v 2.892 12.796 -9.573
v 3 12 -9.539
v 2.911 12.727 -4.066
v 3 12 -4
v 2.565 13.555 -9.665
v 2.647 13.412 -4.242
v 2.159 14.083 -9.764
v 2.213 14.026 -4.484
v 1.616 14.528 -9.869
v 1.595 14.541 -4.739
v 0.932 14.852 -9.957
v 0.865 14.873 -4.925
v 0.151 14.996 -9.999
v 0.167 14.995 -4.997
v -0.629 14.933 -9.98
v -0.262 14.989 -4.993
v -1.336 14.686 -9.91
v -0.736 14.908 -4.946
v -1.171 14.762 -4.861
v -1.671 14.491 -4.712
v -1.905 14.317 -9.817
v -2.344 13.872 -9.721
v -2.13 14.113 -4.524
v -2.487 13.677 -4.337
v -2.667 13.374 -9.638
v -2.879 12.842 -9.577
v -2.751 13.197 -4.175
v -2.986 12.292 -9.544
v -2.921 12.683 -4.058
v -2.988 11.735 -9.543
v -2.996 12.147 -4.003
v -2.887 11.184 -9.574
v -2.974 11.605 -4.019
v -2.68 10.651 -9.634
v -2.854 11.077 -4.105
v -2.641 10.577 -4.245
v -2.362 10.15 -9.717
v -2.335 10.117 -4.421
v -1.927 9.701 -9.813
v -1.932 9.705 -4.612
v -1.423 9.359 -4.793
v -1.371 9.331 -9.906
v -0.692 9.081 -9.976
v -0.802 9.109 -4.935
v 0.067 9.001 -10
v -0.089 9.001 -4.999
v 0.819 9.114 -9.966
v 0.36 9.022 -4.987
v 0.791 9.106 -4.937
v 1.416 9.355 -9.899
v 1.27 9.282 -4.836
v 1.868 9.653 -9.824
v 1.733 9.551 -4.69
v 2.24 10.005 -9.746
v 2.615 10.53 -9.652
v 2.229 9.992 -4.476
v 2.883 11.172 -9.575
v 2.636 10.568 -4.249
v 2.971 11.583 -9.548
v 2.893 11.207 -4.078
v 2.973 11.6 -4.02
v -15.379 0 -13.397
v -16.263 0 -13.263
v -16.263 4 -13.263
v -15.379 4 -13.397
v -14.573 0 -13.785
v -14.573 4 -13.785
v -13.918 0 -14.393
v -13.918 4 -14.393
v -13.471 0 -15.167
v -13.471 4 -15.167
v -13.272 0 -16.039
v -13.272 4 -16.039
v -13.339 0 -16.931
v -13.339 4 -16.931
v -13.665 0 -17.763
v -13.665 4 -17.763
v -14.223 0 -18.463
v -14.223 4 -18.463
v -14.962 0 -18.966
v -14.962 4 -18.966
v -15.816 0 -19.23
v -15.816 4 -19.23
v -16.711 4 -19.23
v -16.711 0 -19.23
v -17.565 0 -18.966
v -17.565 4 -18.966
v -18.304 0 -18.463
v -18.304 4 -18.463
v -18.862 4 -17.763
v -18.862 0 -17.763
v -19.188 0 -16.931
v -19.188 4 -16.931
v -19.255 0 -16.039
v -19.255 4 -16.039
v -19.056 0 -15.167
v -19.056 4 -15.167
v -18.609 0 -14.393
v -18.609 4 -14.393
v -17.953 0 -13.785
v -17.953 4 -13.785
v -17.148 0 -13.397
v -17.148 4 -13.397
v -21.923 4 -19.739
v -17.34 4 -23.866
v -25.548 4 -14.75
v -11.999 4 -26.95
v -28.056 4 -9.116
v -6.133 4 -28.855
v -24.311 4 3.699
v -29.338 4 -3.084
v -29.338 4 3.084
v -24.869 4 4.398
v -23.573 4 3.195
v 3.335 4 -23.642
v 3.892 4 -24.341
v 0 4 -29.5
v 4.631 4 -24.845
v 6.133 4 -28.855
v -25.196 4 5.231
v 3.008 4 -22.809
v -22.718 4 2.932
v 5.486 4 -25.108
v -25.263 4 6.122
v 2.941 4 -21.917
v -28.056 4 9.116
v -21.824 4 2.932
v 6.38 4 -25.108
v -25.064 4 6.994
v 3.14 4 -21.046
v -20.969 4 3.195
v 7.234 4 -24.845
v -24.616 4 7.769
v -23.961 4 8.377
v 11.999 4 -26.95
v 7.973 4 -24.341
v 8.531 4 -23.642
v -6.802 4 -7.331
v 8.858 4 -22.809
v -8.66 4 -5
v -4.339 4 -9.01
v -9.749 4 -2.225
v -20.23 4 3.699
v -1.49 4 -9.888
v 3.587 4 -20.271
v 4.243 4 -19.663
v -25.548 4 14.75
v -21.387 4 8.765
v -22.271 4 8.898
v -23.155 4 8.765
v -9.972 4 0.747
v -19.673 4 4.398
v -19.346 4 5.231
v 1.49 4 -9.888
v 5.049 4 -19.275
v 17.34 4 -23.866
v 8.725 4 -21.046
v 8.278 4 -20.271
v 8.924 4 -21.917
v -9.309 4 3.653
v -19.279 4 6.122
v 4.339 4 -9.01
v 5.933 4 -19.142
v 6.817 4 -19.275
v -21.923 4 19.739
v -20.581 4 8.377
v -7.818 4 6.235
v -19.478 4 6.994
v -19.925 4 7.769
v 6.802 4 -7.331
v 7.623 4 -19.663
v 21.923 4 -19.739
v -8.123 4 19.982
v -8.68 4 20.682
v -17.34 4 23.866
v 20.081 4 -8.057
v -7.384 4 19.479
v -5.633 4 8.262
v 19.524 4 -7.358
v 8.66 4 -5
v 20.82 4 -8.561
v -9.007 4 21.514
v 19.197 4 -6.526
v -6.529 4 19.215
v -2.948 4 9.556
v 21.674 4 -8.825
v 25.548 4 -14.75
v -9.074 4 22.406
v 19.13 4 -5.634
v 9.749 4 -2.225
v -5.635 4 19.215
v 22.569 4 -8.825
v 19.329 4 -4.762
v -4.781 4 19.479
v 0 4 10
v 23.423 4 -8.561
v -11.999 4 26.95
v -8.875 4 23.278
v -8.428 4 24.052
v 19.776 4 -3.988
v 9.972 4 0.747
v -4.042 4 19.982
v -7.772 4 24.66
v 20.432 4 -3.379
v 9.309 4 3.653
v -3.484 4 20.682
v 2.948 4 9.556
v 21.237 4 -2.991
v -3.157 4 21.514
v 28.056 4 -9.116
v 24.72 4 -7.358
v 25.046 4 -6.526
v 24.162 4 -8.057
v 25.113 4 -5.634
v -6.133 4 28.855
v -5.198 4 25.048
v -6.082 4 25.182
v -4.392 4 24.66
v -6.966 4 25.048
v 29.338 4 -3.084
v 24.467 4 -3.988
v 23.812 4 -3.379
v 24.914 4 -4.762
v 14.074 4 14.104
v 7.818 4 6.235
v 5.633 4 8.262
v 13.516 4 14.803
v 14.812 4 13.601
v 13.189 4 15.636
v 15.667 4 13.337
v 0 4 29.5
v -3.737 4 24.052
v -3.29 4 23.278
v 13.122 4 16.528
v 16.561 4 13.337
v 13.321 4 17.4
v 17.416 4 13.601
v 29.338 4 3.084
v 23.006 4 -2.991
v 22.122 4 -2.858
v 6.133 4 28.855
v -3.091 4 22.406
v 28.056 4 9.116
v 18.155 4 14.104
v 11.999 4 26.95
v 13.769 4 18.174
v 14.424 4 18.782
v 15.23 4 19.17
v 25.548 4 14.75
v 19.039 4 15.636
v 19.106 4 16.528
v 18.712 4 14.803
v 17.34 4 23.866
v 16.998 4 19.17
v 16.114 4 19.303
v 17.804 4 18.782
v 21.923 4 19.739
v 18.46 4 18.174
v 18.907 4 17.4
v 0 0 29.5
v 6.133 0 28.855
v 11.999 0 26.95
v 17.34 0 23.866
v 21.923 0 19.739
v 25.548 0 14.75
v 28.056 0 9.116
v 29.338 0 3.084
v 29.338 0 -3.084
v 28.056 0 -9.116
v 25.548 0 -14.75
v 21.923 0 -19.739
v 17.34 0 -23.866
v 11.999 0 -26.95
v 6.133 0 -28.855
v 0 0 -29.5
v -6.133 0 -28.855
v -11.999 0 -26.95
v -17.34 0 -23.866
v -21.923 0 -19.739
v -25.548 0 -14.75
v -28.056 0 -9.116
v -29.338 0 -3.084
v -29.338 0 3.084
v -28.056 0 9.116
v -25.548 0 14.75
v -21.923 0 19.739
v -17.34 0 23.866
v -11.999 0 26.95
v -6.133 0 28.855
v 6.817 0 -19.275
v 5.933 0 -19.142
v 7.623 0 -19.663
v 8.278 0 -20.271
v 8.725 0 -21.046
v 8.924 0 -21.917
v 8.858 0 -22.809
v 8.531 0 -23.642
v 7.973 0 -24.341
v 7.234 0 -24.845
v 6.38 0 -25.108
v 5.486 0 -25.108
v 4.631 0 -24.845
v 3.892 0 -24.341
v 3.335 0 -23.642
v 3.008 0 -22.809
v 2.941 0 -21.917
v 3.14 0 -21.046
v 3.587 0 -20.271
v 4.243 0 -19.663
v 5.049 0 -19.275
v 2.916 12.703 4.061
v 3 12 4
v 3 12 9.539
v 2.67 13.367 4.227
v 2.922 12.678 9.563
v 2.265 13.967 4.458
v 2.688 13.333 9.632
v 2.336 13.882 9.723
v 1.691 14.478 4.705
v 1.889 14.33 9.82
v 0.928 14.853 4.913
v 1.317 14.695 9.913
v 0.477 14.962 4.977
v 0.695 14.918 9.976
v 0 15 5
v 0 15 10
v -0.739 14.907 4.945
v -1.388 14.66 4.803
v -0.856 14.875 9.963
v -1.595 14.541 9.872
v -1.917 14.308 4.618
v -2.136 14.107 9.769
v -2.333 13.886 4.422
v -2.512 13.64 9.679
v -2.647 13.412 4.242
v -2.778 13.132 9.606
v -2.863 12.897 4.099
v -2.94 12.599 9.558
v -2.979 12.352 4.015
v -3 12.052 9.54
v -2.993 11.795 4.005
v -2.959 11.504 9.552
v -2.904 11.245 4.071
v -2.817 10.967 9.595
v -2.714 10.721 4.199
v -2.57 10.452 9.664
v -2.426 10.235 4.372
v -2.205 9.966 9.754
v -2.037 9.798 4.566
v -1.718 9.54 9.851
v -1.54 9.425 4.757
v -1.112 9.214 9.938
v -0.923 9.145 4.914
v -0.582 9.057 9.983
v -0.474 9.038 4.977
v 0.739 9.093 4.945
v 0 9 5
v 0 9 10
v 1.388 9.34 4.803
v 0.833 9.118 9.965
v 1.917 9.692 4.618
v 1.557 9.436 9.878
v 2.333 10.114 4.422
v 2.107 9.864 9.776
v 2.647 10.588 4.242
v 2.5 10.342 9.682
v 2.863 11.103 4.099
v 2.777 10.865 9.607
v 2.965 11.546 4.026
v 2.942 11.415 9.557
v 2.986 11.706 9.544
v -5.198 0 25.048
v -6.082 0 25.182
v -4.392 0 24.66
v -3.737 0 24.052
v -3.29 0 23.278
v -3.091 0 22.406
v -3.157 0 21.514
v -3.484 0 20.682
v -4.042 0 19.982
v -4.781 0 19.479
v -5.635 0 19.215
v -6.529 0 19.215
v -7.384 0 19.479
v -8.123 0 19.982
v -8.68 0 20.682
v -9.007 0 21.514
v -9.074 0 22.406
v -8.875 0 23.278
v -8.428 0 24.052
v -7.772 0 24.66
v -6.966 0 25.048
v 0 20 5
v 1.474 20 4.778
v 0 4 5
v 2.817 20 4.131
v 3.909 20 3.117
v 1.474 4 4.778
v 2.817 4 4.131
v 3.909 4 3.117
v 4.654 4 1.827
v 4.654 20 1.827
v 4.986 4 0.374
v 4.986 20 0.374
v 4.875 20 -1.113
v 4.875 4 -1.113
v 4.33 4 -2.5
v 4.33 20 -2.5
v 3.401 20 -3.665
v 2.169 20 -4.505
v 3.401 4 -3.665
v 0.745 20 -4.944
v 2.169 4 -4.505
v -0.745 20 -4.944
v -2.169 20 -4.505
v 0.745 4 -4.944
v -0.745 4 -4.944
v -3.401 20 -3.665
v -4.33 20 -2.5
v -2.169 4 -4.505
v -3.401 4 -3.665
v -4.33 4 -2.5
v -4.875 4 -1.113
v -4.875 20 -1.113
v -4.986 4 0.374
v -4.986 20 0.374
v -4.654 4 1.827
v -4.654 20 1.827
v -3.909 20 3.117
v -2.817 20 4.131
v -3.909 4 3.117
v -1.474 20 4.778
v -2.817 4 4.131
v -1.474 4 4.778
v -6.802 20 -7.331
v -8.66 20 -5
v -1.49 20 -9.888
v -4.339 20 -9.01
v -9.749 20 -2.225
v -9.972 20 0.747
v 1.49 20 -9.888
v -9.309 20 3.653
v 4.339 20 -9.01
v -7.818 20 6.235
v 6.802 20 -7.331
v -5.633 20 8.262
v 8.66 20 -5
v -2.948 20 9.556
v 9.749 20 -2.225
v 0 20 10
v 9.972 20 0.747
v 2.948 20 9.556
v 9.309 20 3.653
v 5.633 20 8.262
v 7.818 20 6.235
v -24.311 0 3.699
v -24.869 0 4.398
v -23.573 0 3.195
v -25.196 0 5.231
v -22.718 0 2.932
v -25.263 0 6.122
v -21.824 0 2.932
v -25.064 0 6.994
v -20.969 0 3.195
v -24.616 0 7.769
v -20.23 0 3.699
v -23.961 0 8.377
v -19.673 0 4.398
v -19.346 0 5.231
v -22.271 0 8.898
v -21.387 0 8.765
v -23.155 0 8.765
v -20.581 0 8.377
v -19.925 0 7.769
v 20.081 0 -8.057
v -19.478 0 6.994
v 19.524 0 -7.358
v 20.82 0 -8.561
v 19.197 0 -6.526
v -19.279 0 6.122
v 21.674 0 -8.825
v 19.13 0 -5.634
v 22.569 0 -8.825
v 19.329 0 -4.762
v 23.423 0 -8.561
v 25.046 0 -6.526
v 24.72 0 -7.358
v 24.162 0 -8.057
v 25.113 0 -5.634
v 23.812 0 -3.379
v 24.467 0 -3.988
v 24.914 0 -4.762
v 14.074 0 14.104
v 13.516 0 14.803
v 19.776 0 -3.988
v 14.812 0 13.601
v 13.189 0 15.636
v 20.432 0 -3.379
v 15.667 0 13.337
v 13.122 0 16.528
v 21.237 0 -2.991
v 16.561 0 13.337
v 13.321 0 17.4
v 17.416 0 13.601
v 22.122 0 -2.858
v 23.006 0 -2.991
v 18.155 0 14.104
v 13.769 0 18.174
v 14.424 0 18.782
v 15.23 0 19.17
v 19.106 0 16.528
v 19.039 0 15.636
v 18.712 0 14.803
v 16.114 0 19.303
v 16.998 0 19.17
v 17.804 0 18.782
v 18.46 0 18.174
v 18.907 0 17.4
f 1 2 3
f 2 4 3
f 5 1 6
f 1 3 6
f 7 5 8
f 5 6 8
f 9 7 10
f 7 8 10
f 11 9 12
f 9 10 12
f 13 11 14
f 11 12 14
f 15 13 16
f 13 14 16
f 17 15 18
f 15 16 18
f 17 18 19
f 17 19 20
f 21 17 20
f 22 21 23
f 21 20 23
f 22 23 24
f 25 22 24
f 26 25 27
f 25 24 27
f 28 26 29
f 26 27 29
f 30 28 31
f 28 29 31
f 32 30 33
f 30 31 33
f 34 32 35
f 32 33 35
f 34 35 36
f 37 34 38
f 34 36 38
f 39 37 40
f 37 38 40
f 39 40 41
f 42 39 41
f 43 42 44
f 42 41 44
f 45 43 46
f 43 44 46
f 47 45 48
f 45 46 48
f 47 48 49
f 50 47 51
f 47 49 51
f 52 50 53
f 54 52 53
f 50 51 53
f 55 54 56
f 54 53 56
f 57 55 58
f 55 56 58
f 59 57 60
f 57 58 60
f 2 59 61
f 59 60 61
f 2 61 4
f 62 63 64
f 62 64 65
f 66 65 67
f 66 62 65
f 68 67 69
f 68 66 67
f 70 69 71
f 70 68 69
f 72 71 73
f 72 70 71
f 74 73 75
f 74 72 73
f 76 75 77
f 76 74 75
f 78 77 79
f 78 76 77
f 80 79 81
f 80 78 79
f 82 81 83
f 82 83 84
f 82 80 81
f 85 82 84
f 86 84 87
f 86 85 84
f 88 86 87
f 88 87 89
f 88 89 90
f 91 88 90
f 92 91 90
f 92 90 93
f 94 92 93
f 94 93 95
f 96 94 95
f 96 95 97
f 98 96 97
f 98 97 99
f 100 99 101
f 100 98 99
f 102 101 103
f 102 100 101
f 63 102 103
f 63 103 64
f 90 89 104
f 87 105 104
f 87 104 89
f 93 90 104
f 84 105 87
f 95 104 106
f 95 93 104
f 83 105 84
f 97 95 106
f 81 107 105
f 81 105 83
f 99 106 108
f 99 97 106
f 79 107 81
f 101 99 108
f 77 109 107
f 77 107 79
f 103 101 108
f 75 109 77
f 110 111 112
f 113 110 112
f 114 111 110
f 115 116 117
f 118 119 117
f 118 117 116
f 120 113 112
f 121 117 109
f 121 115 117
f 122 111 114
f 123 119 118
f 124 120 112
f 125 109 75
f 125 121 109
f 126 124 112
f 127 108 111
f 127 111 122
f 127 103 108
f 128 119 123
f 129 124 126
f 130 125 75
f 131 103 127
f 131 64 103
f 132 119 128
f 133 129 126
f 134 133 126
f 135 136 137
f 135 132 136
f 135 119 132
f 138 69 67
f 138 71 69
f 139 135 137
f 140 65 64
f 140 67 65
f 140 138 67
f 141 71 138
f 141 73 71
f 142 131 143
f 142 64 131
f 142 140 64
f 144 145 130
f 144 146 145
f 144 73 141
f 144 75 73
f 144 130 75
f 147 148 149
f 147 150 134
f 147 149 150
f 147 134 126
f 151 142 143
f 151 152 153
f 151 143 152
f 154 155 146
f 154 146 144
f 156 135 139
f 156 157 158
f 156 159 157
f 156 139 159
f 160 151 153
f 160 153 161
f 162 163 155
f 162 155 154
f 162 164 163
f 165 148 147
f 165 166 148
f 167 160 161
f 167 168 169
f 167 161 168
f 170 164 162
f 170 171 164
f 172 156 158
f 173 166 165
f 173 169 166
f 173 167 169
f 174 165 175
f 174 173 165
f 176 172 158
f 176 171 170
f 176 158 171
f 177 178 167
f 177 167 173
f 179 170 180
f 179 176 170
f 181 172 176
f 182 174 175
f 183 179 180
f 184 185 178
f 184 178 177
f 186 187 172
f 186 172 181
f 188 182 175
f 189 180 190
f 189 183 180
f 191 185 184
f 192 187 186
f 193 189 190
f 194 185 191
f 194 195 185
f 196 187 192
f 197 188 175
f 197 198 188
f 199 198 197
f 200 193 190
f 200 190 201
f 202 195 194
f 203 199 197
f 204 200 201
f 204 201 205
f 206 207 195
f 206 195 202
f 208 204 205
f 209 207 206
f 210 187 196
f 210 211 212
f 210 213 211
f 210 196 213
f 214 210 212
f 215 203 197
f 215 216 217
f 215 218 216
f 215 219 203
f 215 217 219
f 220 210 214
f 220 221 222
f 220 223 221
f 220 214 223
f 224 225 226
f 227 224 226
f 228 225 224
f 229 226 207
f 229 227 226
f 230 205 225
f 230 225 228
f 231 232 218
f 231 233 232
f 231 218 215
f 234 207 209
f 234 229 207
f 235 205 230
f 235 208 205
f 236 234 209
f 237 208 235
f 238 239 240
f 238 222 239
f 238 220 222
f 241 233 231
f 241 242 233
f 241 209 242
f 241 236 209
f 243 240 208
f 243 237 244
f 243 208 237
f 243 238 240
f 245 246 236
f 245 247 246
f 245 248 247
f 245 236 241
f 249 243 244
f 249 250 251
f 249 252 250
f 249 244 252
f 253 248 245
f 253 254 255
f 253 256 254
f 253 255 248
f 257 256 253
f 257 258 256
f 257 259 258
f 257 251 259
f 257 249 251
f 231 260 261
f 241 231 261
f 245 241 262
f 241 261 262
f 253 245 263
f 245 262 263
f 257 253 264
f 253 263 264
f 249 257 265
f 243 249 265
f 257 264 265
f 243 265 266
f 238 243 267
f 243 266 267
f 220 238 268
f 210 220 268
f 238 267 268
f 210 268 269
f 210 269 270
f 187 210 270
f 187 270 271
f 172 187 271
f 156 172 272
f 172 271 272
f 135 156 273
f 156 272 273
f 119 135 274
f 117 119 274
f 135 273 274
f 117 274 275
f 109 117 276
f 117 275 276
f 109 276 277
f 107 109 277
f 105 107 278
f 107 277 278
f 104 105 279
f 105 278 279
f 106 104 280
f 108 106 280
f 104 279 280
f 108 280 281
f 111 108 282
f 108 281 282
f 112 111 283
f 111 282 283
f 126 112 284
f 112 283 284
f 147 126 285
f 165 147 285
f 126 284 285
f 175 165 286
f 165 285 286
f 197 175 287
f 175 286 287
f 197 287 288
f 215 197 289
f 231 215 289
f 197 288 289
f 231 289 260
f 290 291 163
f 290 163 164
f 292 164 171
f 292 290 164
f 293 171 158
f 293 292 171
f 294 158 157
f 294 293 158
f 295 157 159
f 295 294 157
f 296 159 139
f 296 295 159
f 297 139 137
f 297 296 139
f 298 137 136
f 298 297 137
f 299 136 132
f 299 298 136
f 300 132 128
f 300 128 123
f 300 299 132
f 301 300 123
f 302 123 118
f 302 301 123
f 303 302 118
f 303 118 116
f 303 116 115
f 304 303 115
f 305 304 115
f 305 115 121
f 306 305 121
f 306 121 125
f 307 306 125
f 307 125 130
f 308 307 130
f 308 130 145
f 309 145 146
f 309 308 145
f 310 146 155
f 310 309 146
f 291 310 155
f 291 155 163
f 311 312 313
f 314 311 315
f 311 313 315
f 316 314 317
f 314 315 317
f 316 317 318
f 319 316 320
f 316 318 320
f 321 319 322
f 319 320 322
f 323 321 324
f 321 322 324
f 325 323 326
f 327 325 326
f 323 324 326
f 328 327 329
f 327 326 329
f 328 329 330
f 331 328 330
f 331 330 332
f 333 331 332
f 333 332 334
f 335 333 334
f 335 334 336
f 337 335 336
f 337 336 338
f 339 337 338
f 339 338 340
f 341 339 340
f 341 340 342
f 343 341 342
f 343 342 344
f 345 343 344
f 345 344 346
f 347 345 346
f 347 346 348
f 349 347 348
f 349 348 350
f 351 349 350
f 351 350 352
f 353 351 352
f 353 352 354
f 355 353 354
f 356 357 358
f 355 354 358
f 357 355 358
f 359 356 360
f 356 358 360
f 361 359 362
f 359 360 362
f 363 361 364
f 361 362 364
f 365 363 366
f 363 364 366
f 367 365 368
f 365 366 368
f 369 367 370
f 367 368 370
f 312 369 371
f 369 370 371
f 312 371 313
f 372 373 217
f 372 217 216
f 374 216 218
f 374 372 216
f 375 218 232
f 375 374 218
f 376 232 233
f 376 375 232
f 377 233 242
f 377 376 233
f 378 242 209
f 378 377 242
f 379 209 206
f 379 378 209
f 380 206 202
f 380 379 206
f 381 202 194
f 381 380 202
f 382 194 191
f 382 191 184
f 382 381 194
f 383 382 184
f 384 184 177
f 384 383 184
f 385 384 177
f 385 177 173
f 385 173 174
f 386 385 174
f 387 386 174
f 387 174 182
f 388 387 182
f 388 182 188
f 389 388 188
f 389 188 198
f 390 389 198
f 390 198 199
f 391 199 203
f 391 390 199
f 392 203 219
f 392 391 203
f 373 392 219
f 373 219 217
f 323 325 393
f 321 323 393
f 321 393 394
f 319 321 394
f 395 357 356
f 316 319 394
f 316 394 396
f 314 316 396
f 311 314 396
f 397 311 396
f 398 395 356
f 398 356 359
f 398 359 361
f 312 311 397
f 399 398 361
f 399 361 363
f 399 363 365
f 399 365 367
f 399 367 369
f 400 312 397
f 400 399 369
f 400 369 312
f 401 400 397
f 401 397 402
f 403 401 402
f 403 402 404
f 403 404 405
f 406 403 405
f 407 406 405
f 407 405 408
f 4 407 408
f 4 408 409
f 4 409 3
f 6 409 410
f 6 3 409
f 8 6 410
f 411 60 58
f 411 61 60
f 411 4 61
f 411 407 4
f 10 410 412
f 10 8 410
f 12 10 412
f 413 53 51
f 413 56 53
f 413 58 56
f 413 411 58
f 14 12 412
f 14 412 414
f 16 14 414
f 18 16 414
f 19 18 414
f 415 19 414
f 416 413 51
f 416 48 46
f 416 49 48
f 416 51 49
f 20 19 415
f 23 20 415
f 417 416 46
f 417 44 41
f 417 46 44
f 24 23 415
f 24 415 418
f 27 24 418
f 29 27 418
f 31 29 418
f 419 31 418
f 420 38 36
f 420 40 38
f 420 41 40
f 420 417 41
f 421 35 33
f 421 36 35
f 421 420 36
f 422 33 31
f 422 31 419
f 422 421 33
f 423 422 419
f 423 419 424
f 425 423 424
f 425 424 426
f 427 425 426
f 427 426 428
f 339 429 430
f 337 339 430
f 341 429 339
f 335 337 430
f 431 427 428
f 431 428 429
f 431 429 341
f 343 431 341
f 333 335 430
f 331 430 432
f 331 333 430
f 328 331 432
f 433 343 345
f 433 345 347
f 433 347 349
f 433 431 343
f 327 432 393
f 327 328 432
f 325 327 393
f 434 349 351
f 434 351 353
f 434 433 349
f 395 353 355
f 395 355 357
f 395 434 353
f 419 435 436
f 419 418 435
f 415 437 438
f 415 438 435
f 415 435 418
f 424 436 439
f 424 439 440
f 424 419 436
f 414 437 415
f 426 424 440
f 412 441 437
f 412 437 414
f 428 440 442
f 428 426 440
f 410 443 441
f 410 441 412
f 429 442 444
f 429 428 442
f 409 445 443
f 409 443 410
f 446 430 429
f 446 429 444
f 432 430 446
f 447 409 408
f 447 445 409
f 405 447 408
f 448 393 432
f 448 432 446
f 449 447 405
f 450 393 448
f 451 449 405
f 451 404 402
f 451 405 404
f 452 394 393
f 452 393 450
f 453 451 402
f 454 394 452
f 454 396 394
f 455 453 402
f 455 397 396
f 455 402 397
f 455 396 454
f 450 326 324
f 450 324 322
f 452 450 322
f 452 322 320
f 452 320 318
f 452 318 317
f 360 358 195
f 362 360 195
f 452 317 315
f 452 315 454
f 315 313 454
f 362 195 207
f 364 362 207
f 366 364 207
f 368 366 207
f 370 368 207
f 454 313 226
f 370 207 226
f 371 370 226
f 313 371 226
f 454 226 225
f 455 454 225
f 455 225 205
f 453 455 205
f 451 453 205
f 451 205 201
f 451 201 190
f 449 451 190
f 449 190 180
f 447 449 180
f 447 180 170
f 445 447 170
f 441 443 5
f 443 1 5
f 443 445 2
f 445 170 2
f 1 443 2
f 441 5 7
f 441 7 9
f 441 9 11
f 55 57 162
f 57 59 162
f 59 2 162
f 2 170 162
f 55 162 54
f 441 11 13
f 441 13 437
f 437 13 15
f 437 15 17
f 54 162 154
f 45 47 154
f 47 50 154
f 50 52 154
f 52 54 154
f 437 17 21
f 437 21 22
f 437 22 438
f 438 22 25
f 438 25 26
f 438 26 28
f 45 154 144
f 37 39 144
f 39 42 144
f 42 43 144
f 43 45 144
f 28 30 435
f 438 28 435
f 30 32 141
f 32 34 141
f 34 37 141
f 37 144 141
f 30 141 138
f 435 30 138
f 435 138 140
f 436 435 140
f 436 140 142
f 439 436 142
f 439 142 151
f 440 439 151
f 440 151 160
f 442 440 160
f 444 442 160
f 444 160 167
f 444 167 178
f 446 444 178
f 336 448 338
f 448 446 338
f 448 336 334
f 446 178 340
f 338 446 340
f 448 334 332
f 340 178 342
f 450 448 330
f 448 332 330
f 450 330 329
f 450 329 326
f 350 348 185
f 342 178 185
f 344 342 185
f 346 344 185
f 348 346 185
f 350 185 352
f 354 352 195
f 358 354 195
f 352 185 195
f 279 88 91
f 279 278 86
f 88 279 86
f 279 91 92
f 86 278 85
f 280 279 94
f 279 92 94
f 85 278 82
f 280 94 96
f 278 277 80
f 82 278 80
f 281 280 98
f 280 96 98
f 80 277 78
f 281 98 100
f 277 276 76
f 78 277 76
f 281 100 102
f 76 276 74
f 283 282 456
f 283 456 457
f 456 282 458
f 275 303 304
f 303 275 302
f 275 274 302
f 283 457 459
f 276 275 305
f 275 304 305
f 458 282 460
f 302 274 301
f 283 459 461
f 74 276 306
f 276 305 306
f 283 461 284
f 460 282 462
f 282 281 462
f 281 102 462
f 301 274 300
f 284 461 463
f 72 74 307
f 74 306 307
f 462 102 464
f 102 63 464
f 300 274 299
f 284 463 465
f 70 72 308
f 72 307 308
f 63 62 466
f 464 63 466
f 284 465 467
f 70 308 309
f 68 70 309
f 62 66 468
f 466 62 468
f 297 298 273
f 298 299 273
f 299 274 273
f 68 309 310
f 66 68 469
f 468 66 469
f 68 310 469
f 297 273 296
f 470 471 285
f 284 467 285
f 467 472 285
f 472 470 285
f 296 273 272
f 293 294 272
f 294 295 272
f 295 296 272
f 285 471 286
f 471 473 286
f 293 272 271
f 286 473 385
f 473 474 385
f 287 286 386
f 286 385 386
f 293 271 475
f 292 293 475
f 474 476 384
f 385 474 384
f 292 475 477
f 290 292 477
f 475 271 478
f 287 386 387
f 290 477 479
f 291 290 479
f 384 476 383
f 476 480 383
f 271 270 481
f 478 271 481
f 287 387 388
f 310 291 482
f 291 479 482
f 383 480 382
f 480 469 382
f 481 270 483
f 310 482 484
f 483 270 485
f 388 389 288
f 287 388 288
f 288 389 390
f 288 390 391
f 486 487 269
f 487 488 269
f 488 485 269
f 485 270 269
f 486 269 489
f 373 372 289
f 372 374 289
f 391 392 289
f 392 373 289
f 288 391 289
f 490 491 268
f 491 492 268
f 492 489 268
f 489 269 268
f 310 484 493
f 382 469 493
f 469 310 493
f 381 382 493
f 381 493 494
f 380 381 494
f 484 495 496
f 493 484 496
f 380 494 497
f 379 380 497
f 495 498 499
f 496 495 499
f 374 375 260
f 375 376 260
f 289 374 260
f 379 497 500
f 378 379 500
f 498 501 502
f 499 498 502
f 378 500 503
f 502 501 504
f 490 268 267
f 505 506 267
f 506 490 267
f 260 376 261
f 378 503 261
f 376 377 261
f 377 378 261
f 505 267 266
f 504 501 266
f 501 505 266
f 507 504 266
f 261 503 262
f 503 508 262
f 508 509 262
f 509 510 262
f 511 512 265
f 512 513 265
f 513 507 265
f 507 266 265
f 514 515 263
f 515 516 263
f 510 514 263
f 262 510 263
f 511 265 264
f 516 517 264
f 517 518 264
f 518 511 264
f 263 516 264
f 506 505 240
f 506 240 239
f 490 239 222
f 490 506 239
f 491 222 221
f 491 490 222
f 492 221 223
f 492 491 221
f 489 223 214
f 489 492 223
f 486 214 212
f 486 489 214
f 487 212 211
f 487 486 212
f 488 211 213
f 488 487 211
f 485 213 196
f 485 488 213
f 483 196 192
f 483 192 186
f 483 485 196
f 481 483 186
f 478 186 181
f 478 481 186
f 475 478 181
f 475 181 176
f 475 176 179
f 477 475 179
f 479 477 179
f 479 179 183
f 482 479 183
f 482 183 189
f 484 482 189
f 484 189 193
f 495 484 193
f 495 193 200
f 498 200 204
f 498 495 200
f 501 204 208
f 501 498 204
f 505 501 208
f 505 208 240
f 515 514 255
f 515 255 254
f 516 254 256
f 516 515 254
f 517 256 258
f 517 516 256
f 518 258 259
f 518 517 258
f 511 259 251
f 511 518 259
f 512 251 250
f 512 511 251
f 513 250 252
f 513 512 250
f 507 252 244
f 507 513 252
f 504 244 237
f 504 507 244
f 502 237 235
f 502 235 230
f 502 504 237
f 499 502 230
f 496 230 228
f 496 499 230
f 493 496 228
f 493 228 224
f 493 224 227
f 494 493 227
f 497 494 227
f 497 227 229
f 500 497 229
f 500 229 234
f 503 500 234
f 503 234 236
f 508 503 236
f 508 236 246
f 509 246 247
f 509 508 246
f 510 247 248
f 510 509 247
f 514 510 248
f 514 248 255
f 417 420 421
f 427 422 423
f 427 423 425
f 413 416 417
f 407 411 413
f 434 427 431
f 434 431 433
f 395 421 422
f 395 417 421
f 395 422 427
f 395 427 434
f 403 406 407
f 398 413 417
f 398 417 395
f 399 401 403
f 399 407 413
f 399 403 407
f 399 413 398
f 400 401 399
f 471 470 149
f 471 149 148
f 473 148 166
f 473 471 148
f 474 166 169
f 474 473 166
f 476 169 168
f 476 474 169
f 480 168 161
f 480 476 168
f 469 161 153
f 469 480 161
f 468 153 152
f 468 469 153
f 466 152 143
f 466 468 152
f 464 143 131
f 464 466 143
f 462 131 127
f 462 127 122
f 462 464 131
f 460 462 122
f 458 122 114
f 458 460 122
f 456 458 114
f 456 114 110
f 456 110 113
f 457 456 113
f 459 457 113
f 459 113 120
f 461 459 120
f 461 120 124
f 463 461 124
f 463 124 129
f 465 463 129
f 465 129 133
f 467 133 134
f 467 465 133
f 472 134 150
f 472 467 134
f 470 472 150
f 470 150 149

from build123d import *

# Parameters (mm, degrees)
SKETCH1_R           = 29.5
SKETCH1_R_2         = 3
BOSS_EXTRUDE1_DEPTH = 4
SKETCH2_R           = 10
SKETCH2_R_2         = 5
BOSS_EXTRUDE2_DEPTH = 16
SKETCH3_R           = 3
CUT_EXTRUDE1_DEPTH  = 13


with BuildPart() as part:
    # Sketch1 → Boss-Extrude1 (new body)
    with BuildSketch(Plane(origin=(0, 0, 0), x_dir=(1, 0, 0), z_dir=(0, 1, 0))):
        with Locations(Location((0, 0, 0), (0, 0, 270))):
            Circle(SKETCH1_R)
        with Locations(Location((-16.263455967, 16.263455967, 0), (0, 0, 270))):
            Circle(SKETCH1_R_2, mode=Mode.SUBTRACT)
        with Locations(Location((5.932823239, 22.141597761, 0), (0, 0, 270))):
            Circle(SKETCH1_R_2, mode=Mode.SUBTRACT)
        with Locations(Location((22.121582963, 5.858126996, 0), (0, 0, 270))):
            Circle(SKETCH1_R_2, mode=Mode.SUBTRACT)
        with Locations(Location((16.11406348, -16.303485564, 0), (0, 0, 270))):
            Circle(SKETCH1_R_2, mode=Mode.SUBTRACT)
        with Locations(Location((-6.082215726, -22.181627357, 0), (0, 0, 270))):
            Circle(SKETCH1_R_2, mode=Mode.SUBTRACT)
        with Locations(Location((-22.27097545, -5.898156592, 0), (0, 0, 270))):
            Circle(SKETCH1_R_2, mode=Mode.SUBTRACT)
    extrude(amount=BOSS_EXTRUDE1_DEPTH)

    # Sketch2 → Boss-Extrude2 (add)
    with BuildSketch(Plane(origin=(0, 4, 0), x_dir=(1, 0, 0), z_dir=(0, 1, 0))):
        with Locations(Location((0, 0, 0), (0, 0, 270))):
            Circle(SKETCH2_R)
        with Locations(Location((0, 0, 0), (0, 0, 270))):
            Circle(SKETCH2_R_2, mode=Mode.SUBTRACT)
    extrude(amount=BOSS_EXTRUDE2_DEPTH)

    # Sketch3 → Cut-Extrude1 (cut, symmetric)
    with BuildSketch(Plane.XY):
        with Locations((0, 12)):
            Circle(SKETCH3_R)
    extrude(amount=CUT_EXTRUDE1_DEPTH, both=True, mode=Mode.SUBTRACT)


solid = part.part
